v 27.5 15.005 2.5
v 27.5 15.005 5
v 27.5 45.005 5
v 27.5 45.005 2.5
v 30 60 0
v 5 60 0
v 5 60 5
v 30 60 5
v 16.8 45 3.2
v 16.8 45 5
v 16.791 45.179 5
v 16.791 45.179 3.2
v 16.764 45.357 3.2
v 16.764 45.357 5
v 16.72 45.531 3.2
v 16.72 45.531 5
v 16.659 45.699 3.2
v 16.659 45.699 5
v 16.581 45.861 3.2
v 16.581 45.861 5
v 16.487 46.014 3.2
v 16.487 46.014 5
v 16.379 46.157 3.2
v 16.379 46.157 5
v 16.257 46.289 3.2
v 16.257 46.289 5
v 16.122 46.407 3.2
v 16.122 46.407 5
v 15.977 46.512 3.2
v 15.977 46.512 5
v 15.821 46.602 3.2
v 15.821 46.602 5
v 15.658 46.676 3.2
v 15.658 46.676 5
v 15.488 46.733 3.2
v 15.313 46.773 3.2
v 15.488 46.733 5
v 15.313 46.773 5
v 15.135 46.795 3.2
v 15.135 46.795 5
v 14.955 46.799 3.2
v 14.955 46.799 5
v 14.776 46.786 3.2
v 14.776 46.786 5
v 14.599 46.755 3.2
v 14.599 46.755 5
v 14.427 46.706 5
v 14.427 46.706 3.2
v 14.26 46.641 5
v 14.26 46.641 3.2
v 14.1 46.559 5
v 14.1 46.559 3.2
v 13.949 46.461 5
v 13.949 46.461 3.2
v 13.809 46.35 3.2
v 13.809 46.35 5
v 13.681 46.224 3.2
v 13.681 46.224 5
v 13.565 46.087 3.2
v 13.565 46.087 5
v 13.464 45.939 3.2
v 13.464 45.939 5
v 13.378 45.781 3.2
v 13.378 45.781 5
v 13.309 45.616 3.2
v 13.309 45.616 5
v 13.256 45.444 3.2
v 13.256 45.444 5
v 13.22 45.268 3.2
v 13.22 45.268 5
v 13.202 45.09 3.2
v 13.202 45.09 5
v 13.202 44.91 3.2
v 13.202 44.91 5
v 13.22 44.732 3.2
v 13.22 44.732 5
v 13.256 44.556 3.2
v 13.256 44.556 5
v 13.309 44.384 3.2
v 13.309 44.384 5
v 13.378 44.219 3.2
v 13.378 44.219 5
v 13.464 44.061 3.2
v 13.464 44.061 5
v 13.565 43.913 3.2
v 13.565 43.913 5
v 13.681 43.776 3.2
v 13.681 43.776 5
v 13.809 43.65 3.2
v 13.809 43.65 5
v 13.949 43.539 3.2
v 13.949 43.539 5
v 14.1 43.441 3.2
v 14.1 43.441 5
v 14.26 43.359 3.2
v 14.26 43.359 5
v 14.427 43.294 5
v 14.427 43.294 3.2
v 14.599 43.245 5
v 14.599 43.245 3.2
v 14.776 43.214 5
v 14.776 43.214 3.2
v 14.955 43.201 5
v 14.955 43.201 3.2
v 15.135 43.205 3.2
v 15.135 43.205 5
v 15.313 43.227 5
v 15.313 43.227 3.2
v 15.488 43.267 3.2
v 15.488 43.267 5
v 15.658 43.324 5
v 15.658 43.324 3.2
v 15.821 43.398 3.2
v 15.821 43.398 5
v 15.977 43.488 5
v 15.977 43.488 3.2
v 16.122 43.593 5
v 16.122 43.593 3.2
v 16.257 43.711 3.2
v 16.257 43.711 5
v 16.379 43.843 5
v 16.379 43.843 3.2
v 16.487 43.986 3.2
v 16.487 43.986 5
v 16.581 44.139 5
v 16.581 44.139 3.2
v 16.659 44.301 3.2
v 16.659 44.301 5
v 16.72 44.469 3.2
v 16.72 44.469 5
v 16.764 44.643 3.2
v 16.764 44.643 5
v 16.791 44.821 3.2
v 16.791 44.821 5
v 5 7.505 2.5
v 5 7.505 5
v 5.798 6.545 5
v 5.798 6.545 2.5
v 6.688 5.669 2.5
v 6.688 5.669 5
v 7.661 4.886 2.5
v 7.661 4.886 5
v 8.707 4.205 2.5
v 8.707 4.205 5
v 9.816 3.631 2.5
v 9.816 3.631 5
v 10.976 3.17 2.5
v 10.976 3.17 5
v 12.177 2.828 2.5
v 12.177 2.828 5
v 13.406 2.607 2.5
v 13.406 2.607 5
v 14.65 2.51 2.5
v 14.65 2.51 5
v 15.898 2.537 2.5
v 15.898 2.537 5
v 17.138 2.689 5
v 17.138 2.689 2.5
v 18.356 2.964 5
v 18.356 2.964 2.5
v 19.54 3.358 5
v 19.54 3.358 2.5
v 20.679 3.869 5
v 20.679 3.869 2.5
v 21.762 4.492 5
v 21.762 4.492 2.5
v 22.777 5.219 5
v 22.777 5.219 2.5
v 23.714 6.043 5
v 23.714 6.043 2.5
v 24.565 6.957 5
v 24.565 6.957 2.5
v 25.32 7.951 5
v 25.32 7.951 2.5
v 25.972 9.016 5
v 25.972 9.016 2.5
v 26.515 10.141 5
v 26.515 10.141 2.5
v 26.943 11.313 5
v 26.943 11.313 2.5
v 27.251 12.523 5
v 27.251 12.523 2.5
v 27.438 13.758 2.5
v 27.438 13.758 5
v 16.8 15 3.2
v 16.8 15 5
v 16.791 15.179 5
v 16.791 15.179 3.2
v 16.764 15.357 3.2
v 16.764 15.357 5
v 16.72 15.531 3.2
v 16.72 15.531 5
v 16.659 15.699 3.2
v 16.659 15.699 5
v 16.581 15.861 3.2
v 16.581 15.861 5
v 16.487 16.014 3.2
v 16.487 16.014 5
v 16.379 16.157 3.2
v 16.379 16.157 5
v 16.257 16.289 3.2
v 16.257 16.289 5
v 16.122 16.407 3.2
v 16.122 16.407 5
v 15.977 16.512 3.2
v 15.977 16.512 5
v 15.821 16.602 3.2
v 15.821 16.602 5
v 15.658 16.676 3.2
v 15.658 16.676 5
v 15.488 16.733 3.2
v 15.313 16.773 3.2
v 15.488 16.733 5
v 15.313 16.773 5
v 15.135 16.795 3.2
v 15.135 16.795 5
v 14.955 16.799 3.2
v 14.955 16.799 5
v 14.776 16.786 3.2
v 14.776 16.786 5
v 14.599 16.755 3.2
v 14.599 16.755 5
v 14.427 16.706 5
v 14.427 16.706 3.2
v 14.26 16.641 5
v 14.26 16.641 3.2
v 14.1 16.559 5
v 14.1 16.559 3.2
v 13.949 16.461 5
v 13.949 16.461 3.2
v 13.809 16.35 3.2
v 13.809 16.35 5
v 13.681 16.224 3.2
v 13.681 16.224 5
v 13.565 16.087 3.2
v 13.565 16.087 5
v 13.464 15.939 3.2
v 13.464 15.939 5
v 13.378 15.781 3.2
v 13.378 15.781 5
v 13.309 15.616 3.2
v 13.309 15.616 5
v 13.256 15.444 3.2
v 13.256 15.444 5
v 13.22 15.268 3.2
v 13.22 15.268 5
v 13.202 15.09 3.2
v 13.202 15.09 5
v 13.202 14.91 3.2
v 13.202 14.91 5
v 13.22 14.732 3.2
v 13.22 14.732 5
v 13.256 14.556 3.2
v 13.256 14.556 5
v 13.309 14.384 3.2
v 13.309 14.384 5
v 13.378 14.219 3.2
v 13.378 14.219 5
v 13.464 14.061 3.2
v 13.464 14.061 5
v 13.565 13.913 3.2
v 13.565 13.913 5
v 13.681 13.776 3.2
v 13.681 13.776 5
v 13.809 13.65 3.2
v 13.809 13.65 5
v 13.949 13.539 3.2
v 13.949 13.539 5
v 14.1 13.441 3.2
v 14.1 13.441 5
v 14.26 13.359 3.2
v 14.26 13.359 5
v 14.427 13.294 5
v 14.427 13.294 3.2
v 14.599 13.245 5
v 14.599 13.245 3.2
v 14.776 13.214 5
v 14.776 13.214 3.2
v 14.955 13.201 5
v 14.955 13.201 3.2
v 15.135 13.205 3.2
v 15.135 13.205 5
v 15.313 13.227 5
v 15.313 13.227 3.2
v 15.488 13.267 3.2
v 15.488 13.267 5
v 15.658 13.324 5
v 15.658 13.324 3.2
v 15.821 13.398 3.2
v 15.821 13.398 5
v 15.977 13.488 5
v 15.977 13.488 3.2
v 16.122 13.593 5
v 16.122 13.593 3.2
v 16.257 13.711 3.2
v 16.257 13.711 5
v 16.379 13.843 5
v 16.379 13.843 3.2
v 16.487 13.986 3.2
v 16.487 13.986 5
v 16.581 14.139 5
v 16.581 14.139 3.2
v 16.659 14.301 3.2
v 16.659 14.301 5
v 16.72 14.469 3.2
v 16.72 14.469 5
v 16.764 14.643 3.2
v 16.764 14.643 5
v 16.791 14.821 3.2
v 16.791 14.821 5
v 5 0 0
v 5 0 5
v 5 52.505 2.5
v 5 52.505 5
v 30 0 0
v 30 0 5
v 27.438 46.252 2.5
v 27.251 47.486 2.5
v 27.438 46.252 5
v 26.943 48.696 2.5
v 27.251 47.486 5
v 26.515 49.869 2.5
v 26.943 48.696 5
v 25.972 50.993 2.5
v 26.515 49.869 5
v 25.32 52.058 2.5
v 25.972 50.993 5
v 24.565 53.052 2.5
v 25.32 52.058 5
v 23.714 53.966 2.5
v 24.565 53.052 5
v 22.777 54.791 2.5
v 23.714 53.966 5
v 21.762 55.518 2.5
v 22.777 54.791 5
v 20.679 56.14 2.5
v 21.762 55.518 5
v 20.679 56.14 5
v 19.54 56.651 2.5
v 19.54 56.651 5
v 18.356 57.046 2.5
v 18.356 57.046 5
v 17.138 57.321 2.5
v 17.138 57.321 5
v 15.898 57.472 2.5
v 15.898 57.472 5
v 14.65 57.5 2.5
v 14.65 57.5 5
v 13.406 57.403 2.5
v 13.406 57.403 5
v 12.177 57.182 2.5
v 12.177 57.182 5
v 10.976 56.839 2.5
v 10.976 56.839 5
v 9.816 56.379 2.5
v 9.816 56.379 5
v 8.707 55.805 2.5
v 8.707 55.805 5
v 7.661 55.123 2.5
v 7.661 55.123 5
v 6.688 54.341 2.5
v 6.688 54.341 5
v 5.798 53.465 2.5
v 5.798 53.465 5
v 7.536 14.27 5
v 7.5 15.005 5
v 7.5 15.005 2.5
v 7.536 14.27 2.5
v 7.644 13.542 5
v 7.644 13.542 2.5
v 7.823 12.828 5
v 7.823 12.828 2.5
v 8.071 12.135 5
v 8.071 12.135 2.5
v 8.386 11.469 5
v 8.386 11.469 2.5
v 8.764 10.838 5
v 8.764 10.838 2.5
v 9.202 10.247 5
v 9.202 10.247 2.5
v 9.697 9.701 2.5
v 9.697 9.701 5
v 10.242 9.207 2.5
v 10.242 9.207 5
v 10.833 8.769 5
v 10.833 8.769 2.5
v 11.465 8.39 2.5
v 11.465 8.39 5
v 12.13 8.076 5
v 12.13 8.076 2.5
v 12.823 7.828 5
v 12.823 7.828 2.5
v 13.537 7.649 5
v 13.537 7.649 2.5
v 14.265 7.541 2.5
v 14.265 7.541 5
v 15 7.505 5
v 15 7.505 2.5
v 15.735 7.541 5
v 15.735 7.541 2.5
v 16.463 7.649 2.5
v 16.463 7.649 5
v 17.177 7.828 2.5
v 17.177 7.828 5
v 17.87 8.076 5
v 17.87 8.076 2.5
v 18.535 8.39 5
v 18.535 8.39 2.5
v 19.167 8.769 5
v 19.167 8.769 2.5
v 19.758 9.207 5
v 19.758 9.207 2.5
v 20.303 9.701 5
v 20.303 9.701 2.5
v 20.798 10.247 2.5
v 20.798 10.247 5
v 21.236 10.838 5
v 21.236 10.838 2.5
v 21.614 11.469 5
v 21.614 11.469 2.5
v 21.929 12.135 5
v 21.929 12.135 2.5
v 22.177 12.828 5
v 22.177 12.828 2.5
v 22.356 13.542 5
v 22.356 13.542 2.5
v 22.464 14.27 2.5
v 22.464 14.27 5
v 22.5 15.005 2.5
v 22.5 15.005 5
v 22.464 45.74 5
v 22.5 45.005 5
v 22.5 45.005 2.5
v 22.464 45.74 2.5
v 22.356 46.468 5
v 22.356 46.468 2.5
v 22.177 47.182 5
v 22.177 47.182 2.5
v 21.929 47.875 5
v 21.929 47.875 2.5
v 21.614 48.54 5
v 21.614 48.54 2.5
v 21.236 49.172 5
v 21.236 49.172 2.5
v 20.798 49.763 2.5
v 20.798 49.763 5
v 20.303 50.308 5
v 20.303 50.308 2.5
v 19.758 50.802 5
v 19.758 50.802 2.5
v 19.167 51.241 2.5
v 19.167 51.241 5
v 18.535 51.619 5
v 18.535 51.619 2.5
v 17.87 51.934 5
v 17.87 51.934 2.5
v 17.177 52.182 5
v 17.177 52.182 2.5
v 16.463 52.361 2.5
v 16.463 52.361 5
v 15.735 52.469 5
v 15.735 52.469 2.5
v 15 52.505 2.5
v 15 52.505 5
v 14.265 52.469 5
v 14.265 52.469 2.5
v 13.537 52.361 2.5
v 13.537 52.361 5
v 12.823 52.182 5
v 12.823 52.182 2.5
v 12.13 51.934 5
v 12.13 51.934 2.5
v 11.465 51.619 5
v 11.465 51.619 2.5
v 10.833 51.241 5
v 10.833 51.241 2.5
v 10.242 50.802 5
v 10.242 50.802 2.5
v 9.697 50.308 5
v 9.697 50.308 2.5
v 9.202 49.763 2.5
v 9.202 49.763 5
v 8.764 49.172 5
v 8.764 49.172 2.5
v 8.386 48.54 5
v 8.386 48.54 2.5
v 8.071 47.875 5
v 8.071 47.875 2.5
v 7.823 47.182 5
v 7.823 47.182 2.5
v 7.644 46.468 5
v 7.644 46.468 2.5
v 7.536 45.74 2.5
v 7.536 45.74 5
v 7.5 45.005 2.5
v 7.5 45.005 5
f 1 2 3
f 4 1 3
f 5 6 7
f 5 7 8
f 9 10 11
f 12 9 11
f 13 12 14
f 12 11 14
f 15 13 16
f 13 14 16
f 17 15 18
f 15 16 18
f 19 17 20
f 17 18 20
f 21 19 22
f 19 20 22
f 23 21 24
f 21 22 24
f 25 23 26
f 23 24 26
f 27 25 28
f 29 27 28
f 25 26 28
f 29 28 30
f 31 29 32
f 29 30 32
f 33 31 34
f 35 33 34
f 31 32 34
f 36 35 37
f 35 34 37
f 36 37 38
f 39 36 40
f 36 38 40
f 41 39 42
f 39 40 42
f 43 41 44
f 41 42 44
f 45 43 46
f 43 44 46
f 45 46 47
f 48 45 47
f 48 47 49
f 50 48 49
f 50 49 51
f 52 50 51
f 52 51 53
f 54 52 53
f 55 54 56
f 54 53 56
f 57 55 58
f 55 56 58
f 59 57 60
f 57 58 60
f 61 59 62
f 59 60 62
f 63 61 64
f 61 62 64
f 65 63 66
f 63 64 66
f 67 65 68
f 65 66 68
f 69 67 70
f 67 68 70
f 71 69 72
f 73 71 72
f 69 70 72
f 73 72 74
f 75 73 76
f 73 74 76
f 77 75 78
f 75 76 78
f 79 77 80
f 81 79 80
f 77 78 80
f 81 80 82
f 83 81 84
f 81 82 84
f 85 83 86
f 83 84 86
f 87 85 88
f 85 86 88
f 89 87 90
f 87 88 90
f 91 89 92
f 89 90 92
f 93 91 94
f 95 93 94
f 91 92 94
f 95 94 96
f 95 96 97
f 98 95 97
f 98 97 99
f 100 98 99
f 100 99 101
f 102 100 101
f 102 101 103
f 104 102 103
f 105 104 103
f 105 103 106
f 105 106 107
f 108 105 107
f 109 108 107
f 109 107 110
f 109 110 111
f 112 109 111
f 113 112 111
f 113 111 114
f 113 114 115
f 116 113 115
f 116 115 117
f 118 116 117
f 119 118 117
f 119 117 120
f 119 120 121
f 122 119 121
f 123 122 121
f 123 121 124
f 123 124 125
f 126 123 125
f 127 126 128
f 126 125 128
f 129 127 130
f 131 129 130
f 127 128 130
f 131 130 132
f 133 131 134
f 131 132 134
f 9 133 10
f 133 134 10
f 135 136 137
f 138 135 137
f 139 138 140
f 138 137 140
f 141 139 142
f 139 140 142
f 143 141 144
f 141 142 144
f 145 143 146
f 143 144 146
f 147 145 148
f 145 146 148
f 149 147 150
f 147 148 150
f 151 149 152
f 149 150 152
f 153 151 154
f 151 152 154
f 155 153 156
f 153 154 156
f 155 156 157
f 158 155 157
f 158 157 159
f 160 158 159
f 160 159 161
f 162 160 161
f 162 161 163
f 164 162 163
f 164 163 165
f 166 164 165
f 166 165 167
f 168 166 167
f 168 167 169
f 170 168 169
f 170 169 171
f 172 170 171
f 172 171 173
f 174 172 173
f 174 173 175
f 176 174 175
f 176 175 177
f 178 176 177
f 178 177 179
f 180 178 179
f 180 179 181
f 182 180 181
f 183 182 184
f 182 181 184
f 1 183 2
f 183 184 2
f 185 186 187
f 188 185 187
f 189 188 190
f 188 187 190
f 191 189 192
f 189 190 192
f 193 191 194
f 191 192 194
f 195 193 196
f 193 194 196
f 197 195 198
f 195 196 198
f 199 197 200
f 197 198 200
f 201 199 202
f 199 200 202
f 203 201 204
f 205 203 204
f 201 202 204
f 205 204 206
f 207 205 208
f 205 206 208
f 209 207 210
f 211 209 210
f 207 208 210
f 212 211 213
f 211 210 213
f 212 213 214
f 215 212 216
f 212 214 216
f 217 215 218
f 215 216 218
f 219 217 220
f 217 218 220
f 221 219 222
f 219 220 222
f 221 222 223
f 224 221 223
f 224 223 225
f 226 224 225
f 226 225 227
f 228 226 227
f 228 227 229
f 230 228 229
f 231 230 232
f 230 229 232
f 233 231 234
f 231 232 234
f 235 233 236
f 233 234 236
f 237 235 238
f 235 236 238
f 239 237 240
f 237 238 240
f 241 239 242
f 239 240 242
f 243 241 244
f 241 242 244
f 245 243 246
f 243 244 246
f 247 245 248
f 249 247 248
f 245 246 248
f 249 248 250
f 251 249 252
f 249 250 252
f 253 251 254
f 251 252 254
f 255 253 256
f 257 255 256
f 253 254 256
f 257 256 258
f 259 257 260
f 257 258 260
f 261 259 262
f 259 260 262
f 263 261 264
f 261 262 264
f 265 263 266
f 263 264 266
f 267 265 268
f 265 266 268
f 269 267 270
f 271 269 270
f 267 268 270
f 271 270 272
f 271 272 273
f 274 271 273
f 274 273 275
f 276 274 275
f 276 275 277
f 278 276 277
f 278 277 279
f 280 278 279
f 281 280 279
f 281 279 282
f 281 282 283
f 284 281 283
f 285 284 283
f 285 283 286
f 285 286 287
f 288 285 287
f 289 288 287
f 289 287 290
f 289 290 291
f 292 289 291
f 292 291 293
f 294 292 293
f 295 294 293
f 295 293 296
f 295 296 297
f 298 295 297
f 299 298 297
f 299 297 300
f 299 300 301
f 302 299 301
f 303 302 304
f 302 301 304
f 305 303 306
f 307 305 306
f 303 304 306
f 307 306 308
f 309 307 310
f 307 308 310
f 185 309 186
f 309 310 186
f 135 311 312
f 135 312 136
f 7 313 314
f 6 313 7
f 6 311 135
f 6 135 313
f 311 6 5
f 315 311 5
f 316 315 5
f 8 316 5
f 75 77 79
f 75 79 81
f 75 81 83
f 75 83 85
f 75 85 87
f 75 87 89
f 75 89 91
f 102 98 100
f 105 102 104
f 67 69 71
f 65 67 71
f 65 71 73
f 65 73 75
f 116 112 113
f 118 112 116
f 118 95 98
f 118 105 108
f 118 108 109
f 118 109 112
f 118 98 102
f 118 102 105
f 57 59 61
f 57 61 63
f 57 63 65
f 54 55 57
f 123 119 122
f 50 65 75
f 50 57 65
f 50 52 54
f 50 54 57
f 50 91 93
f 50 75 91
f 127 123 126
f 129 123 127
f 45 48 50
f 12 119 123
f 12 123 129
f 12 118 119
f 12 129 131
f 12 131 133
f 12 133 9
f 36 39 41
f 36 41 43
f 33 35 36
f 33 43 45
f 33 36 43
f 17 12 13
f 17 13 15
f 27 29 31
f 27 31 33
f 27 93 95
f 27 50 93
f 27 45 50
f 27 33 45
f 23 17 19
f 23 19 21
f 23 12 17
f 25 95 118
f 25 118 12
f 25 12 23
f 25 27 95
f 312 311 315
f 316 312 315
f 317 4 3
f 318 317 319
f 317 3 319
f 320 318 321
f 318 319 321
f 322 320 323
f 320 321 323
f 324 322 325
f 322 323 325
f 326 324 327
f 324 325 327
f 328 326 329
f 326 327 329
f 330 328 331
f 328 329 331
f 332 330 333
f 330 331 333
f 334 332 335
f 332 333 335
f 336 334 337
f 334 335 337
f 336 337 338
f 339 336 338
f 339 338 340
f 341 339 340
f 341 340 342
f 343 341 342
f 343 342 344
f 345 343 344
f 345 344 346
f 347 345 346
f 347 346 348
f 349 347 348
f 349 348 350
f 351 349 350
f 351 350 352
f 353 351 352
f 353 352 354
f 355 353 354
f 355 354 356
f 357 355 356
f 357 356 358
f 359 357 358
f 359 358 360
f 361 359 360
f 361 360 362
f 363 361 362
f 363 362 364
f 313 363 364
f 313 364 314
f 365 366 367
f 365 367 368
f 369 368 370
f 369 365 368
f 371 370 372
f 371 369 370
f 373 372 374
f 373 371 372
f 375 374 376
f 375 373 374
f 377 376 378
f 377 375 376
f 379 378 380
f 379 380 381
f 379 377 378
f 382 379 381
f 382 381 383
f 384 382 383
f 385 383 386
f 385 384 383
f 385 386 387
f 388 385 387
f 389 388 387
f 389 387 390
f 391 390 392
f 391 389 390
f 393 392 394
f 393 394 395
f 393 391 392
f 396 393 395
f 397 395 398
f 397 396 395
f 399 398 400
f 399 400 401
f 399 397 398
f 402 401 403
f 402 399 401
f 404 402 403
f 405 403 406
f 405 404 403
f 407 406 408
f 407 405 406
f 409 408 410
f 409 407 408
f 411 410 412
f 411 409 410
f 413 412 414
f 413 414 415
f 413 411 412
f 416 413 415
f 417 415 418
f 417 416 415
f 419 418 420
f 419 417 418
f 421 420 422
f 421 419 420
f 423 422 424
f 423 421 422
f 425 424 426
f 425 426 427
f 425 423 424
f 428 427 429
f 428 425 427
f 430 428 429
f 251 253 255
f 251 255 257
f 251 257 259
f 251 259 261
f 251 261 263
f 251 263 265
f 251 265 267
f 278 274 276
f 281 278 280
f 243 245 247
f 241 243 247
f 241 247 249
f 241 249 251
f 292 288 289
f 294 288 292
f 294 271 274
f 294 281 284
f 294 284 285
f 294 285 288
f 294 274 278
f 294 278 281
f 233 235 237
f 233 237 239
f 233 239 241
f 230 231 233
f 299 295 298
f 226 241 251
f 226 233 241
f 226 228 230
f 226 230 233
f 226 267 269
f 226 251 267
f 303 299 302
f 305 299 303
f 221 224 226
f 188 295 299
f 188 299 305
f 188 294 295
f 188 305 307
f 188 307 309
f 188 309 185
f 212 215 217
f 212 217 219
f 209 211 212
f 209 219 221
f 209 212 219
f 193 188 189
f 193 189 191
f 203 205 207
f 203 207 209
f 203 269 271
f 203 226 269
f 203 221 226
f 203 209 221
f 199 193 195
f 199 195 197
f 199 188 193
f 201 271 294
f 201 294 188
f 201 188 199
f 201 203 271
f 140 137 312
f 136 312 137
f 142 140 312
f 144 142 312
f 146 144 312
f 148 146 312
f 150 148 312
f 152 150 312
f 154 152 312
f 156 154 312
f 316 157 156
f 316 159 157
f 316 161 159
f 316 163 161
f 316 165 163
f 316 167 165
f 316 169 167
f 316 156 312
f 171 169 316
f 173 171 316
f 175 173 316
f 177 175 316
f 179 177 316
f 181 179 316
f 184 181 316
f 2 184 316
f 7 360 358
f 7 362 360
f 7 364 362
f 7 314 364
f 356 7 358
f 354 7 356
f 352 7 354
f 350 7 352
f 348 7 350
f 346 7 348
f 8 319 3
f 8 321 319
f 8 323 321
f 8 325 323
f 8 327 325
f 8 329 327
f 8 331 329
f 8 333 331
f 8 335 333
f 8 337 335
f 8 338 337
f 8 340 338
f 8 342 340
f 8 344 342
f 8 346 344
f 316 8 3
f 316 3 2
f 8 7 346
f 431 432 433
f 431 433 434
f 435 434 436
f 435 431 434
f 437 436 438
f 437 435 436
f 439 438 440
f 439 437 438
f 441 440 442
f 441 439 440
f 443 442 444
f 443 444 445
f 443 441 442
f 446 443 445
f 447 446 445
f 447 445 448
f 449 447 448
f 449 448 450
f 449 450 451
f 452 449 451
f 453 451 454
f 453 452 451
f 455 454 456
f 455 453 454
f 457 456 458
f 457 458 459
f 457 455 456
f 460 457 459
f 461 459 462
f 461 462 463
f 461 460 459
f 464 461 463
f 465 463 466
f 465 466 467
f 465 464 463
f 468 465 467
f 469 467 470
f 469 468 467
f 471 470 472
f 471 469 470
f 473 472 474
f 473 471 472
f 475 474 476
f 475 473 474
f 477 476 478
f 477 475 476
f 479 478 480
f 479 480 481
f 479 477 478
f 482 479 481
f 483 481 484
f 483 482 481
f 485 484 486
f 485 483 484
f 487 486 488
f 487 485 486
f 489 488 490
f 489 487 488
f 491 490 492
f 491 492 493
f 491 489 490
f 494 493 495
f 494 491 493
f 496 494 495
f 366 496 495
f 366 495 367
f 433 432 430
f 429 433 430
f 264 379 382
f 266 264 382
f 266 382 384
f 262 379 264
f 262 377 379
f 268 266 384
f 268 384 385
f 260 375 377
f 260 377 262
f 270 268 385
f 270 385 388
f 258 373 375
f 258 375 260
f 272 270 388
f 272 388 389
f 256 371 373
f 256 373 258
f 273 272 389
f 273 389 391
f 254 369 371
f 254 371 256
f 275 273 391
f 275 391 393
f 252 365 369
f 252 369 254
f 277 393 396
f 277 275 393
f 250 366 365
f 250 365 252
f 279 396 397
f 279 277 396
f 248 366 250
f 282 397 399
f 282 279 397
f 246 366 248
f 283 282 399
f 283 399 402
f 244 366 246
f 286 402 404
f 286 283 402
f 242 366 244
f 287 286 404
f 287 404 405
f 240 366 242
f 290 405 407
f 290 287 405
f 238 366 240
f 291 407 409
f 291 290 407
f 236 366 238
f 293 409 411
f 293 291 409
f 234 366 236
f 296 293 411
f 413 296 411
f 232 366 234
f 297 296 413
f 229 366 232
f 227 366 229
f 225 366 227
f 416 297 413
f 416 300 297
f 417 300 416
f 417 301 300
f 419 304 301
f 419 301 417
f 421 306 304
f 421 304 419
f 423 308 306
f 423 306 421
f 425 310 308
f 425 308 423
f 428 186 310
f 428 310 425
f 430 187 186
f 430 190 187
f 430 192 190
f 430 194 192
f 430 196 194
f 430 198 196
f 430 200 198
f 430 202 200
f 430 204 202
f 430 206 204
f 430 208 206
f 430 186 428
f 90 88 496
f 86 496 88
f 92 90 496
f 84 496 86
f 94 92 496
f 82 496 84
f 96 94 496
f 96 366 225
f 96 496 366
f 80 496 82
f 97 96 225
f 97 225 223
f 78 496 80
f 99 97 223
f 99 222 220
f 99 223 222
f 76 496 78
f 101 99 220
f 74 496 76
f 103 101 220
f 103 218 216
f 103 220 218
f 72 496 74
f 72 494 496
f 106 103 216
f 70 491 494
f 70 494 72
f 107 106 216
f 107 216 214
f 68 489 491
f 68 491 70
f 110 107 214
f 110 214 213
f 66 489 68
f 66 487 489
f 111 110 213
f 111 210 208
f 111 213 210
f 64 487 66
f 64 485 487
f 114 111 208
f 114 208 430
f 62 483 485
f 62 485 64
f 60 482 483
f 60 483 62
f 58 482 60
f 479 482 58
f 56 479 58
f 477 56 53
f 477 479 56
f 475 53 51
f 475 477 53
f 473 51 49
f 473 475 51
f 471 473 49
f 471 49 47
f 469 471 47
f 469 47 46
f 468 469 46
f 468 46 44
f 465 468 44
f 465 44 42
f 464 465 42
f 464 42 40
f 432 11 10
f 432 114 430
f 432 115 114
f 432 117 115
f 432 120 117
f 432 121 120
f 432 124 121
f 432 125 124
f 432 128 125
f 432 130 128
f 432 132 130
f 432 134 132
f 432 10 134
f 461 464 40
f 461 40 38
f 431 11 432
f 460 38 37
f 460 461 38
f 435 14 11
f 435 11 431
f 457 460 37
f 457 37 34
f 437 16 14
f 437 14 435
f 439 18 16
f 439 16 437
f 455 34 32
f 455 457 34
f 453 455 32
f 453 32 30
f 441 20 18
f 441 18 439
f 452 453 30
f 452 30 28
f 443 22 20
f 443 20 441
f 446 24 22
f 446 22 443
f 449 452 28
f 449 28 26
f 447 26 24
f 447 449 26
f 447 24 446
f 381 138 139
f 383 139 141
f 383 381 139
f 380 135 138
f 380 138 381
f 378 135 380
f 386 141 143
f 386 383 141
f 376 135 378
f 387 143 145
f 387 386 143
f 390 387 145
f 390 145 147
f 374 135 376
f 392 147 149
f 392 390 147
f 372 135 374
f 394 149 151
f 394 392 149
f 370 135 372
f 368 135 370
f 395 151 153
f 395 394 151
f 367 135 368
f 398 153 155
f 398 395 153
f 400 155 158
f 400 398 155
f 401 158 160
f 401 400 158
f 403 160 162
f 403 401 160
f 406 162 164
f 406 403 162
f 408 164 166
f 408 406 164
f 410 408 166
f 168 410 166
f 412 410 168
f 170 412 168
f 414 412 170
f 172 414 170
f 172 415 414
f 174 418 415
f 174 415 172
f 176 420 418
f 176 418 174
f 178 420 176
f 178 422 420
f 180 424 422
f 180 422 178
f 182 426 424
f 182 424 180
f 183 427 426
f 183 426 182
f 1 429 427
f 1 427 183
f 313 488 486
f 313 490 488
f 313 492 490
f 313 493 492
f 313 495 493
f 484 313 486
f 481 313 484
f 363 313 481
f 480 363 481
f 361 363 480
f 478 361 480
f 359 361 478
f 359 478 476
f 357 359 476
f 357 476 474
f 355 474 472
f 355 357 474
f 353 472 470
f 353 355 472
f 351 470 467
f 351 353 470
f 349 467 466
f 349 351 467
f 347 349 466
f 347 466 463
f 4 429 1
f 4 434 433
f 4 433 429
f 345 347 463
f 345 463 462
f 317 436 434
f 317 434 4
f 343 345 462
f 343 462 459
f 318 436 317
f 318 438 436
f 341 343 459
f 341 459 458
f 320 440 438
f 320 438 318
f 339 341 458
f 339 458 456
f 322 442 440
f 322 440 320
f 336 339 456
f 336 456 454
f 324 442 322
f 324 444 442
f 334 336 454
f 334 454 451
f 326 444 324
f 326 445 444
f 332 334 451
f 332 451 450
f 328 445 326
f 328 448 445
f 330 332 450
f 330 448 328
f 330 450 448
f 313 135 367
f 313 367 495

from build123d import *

# Parameters (mm, degrees)
SKETCH_W        = 25
SKETCH_H        = 60
PAD_DEPTH       = 5
POCKET_DEPTH    = 2.5
SKETCH002_R     = 1.8
POCKET001_DEPTH = 1.8


with BuildPart() as part:
    # Sketch → Pad (new body)
    with BuildSketch(Plane.XY):
        with Locations((17.5, 30)):
            Rectangle(SKETCH_W, SKETCH_H)
    extrude(amount=PAD_DEPTH)

    # Sketch001 → Pocket (cut)
    with BuildSketch(Plane.XY.offset(5)):
        with BuildLine():
            ThreePointArc((27.5, 45.004765), (15, 57.504765), (2.5, 45.004764))
            Line((2.5, 45.004764), (2.5, 15.004765))
            ThreePointArc((2.5, 15.004765), (15, 2.504765), (27.5, 15.004765))
            Line((27.5, 15.004765), (27.5, 45.004765))
        make_face()
        with BuildLine():
            ThreePointArc((22.5, 45.004765), (15, 52.504765), (7.5, 45.004765))
            Line((7.5, 45.004765), (7.5, 15.004765))
            ThreePointArc((7.5, 15.004765), (15, 7.504765), (22.5, 15.004765))
            Line((22.5, 45.004765), (22.5, 15.004765))
        make_face(mode=Mode.SUBTRACT)
    extrude(amount=-POCKET_DEPTH, mode=Mode.SUBTRACT)

    # Sketch002 → Pocket001 (cut)
    with BuildSketch(Plane.XY.offset(5)):
        with Locations((15, 45)):
            Circle(SKETCH002_R)
        with Locations((15, 15)):
            Circle(SKETCH002_R)
    extrude(amount=-POCKET001_DEPTH, mode=Mode.SUBTRACT)


solid = part.part
